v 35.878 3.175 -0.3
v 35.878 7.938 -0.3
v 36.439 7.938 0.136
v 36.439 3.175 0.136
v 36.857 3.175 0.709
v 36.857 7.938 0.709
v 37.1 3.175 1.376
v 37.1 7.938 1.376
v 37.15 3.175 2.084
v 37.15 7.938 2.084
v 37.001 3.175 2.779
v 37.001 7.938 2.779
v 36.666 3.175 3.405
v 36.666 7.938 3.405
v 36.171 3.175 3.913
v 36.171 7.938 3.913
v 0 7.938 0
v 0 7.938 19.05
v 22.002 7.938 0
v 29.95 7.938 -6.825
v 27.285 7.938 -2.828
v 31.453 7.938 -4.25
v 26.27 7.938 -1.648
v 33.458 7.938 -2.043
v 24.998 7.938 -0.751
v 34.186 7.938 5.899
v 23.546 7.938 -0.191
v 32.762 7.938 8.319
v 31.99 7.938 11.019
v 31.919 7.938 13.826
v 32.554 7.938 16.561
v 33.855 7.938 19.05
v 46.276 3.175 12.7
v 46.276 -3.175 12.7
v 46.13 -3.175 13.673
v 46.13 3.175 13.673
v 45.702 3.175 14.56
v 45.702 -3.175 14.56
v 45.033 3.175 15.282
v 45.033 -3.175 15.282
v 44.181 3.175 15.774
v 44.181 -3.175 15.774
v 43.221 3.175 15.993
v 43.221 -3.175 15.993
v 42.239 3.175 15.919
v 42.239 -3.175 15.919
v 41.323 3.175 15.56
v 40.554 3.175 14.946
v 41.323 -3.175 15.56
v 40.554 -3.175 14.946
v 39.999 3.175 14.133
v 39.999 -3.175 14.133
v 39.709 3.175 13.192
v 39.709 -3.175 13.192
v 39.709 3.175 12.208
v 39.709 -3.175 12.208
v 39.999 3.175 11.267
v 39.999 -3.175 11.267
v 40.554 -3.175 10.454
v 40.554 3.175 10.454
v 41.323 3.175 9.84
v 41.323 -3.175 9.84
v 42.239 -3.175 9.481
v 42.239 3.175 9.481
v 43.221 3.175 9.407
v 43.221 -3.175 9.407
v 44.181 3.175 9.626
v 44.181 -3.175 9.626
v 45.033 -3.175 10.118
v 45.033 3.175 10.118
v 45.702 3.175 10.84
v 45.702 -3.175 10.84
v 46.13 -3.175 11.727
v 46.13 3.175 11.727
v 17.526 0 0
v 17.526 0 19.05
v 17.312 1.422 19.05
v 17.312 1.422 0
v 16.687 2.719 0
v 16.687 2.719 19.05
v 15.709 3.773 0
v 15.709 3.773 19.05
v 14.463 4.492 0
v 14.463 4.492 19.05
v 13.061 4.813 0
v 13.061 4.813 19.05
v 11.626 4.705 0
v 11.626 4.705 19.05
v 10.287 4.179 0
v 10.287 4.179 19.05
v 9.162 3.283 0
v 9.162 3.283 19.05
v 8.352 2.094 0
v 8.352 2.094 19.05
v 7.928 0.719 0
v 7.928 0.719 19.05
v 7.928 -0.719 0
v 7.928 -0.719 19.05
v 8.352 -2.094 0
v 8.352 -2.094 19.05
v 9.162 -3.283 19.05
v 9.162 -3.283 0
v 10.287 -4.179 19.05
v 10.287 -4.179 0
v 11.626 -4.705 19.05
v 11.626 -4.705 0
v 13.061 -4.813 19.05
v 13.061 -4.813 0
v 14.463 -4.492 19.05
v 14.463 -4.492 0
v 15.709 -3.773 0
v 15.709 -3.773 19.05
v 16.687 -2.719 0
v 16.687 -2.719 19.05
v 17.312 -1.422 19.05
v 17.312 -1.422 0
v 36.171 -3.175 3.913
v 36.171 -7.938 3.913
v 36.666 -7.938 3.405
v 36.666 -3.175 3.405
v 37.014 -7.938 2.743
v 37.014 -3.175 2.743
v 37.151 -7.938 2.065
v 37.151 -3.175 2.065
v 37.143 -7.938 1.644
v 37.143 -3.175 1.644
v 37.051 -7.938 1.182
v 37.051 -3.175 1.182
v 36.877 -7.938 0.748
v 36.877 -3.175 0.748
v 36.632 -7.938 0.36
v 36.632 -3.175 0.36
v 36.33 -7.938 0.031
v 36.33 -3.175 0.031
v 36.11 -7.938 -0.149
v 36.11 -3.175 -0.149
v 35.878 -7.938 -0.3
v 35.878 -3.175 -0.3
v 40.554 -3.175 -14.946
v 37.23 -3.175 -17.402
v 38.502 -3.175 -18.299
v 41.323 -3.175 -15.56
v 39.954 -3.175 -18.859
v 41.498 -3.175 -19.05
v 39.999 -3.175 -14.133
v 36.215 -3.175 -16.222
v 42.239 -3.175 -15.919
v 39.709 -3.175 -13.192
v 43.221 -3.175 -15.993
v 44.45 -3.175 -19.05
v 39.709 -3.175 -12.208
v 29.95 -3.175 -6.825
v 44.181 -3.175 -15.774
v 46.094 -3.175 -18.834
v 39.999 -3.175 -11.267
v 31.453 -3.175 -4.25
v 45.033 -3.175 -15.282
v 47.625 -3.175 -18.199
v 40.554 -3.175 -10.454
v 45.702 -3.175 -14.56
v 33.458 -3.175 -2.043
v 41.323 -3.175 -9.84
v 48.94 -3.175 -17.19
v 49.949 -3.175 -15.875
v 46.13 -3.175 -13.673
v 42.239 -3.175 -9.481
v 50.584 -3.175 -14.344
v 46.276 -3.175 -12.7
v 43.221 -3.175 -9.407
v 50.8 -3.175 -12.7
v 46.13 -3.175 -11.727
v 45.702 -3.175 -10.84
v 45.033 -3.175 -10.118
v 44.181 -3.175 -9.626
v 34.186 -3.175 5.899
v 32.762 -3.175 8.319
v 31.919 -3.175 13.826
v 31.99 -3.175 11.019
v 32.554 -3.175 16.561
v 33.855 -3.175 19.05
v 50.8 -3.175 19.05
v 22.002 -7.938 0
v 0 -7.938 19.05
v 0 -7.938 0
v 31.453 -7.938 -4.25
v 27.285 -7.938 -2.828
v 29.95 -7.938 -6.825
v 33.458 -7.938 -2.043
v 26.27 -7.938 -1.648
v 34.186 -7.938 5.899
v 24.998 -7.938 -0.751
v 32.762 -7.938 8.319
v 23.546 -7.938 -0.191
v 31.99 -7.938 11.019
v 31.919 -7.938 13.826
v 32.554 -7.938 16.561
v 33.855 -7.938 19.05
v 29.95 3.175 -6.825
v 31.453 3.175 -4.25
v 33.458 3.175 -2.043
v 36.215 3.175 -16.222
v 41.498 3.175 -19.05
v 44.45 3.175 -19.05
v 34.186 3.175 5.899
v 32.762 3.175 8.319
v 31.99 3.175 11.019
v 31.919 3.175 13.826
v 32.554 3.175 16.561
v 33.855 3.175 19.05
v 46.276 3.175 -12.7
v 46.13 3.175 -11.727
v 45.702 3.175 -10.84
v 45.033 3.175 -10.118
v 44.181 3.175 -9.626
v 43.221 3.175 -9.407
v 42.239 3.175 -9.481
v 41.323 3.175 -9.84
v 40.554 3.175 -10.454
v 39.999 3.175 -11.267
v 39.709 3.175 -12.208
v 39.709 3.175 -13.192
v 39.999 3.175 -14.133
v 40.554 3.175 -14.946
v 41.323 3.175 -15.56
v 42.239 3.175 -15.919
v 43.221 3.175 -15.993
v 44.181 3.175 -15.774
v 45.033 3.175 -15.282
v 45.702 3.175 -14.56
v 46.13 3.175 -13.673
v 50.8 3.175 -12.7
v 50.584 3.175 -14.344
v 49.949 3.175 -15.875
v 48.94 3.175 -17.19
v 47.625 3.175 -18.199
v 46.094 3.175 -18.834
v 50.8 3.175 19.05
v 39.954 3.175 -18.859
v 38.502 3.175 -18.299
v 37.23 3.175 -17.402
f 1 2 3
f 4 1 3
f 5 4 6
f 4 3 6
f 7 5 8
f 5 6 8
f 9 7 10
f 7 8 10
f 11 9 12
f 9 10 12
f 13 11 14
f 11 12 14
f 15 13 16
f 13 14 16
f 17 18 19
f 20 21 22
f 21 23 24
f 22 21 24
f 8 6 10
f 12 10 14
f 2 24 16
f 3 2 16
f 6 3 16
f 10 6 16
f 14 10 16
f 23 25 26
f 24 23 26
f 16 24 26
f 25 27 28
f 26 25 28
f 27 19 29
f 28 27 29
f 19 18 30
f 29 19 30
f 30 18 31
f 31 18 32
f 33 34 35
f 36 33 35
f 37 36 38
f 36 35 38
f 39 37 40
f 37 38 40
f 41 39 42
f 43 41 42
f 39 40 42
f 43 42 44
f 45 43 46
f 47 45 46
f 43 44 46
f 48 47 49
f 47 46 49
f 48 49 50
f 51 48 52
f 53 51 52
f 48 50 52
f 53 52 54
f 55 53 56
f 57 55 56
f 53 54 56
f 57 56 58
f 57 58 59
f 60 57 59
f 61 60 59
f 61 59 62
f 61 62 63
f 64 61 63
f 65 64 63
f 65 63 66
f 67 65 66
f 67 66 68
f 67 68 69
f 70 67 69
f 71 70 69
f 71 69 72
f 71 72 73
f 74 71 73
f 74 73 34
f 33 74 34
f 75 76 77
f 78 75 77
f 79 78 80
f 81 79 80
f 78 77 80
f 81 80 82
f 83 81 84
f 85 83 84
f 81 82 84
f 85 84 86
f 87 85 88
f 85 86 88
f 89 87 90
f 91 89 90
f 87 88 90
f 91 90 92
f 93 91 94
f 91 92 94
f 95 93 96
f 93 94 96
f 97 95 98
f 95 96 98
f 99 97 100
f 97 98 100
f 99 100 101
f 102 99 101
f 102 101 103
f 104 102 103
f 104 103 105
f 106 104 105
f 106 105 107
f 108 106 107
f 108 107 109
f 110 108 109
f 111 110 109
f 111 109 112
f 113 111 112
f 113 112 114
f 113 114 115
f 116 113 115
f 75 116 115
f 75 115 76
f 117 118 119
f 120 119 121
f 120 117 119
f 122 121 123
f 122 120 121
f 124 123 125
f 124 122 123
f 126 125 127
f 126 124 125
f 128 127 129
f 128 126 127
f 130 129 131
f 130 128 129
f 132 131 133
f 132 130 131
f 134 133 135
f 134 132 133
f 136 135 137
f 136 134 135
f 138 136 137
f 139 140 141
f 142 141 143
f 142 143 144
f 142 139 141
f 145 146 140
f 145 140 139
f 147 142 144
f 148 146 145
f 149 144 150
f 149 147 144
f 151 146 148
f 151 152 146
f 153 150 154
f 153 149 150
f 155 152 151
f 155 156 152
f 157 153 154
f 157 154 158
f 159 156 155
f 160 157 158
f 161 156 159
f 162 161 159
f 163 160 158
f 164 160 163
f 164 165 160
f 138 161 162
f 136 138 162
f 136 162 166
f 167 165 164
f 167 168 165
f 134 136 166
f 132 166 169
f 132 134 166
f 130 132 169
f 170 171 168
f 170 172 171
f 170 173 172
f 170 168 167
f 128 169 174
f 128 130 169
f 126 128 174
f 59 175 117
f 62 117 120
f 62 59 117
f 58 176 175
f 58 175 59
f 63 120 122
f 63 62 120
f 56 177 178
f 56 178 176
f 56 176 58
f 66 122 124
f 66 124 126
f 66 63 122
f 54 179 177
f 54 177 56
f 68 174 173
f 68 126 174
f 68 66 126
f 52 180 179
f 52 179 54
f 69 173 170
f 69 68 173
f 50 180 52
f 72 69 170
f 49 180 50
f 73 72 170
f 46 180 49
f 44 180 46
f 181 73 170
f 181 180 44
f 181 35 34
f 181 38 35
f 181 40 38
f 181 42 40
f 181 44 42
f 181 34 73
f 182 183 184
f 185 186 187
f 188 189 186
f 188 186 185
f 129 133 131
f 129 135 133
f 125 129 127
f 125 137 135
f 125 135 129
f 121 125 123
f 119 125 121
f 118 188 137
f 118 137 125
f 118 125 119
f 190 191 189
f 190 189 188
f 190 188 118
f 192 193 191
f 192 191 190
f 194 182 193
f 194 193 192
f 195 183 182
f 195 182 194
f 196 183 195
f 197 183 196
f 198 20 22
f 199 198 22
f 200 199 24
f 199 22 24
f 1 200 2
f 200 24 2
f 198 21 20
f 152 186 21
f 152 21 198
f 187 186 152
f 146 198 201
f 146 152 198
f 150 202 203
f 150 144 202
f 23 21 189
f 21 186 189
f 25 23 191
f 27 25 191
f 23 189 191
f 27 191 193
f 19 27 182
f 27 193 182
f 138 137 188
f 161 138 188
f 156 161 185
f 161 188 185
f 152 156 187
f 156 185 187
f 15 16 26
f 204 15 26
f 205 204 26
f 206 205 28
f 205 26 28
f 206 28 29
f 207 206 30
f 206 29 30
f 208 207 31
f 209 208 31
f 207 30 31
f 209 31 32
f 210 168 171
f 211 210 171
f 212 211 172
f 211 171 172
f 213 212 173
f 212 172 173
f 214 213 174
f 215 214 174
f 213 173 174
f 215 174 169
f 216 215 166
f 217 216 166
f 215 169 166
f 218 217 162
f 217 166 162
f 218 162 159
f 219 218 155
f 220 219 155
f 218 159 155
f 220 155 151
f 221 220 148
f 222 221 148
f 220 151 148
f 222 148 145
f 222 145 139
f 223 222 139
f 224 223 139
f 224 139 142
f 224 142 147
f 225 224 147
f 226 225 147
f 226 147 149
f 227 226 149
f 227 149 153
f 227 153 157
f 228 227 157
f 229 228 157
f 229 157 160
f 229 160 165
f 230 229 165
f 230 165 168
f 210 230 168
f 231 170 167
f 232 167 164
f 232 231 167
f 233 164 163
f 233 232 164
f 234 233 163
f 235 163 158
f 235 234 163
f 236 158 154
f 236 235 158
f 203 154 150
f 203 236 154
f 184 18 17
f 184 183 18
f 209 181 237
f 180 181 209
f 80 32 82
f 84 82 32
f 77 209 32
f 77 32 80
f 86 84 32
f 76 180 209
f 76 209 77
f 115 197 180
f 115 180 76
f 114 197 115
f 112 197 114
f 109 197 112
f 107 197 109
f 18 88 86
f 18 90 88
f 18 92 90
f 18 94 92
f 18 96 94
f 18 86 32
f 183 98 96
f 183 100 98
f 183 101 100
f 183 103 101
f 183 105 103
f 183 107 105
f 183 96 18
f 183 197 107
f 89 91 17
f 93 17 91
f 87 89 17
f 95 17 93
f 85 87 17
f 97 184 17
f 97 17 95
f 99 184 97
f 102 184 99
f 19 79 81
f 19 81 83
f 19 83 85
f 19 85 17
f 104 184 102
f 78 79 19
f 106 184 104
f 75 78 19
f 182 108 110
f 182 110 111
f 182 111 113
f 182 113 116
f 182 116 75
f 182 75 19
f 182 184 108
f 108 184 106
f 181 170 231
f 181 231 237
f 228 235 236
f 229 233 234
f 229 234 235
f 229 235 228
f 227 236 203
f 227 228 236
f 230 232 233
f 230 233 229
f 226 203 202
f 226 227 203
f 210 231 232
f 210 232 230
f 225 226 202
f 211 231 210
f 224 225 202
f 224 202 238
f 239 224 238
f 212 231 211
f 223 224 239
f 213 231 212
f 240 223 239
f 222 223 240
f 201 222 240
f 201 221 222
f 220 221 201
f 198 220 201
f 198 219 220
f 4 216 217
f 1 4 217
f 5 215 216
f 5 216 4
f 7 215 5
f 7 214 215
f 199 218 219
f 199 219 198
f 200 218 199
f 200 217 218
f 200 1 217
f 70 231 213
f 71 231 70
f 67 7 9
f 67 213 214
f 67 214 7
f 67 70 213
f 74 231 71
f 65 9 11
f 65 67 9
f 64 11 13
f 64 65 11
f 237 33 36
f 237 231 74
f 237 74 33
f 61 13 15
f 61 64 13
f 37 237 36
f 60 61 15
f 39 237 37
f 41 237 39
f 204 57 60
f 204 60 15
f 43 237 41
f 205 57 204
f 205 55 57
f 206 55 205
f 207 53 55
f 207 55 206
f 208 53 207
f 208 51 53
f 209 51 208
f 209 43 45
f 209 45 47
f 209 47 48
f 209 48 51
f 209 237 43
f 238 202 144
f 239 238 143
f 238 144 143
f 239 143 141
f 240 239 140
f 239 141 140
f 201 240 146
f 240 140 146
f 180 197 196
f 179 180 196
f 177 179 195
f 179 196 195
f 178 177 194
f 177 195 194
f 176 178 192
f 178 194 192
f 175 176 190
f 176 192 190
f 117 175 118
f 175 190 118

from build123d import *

# Parameters (mm, degrees)
F1_DEPTH      = 7.9375
F1_DEPTH_BACK = 7.9375
F2_R          = 6.35
F3_R          = 3.302
F4_DEPTH      = 25.4
F6_DEPTH      = 4.7625
F7_R          = 2.54
F9_DEPTH      = 4.7625
F10_R         = 4.826
F11_DEPTH     = 38.101


with BuildPart() as f1:
    # F0 (on Front) → F1 (new body, two sides)
    with BuildSketch(Plane.XZ) as f1_sk:
        Polygon((0, 19.05), (0, 0), (25.4, 0), (38.1, -19.05), (50.8, -19.05), (50.8, 19.05), align=None)
    extrude(amount=F1_DEPTH)
    extrude(f1_sk.sketch, amount=-F1_DEPTH_BACK)

    # F2
    f2_edges = [f1.edges().sort_by_distance(p)[0] for p in [
        (25.4, 0, 0),
        (38.1, 0, -19.05),
        (50.8, 0, -19.05),
    ]]
    fillet(f2_edges, radius=F2_R)

    # F3 (on face) → F4 (cut)
    with BuildSketch(Plane.XZ.offset(7.9375)):
        with Locations((42.974208, -12.7)):
            Circle(F3_R)
        with Locations((42.974208, 12.7)):
            Circle(F3_R)
    extrude(amount=-F4_DEPTH, mode=Mode.SUBTRACT)

    # F5 (on face) → F6 (cut)
    with BuildSketch(Plane.XZ.offset(7.9375)):
        with BuildLine():
            Line((42.974208, -12.7), (42.974208, 1.5875))
            ThreePointArc((42.974208, 1.5875), (32.87142, -22.802788), (57.261708, -12.7))
            Line((57.261708, -12.7), (42.974208, -12.7))
        make_face()
        with BuildLine():
            ThreePointArc((54.086708, 12.7), (35.116484, 20.557724), (42.974208, 1.5875))
            Line((42.974208, 1.5875), (42.974208, 12.7))
            Line((42.974208, 12.7), (54.086708, 12.7))
        make_face()
        Polygon((42.974208, 12.7), (42.974208, 1.5875), (42.974208, -12.7), (57.261708, -12.7), (61.707854, -12.7), (61.707854, 12.7), (54.086708, 12.7), align=None)
    extrude(amount=-F6_DEPTH, mode=Mode.SUBTRACT)

    # F7
    f7_edges = [f1.edges().sort_by_distance(p)[0] for p in [
        (42.974208, -5.55625, 1.5875),
    ]]
    fillet(f7_edges, radius=F7_R)

    # F8 (on face) → F9 (cut)
    with BuildSketch(Plane(origin=(0, 7.9375, 0), x_dir=(-1, 0, 0), z_dir=(0, 1, 0))):
        with BuildLine():
            Line((-50.8, 19.05), (-50.8, -12.7))
            ThreePointArc((-50.8, -12.7), (-48.940128, -17.190128), (-44.45, -19.05))
            Line((-44.45, -19.05), (-41.498417, -19.05))
            ThreePointArc((-41.498417, -19.05), (-38.502119, -18.298634), (-36.214897, -16.222346))
            Line((-36.214897, -16.222346), (-29.950297, -6.825446))
            ThreePointArc((-29.950297, -6.825446), (-32.398052, -3.093879), (-35.877663, -0.299528))
            ThreePointArc((-35.877663, -0.299528), (-37.149918, 1.728535), (-36.17106, 3.913372))
            ThreePointArc((-36.17106, 3.913372), (-31.989583, 11.019032), (-33.854715, 19.05))
            Line((-33.854715, 19.05), (-50.8, 19.05))
        make_face()
    extrude(amount=-F9_DEPTH, mode=Mode.SUBTRACT)

    # F10 (on face) → F11 (cut, through all)
    with BuildSketch(Plane.XY.offset(19.05)):
        with Locations((12.7, 0)):
            Circle(F10_R)
    extrude(amount=-F11_DEPTH, mode=Mode.SUBTRACT)


solid = f1.part
